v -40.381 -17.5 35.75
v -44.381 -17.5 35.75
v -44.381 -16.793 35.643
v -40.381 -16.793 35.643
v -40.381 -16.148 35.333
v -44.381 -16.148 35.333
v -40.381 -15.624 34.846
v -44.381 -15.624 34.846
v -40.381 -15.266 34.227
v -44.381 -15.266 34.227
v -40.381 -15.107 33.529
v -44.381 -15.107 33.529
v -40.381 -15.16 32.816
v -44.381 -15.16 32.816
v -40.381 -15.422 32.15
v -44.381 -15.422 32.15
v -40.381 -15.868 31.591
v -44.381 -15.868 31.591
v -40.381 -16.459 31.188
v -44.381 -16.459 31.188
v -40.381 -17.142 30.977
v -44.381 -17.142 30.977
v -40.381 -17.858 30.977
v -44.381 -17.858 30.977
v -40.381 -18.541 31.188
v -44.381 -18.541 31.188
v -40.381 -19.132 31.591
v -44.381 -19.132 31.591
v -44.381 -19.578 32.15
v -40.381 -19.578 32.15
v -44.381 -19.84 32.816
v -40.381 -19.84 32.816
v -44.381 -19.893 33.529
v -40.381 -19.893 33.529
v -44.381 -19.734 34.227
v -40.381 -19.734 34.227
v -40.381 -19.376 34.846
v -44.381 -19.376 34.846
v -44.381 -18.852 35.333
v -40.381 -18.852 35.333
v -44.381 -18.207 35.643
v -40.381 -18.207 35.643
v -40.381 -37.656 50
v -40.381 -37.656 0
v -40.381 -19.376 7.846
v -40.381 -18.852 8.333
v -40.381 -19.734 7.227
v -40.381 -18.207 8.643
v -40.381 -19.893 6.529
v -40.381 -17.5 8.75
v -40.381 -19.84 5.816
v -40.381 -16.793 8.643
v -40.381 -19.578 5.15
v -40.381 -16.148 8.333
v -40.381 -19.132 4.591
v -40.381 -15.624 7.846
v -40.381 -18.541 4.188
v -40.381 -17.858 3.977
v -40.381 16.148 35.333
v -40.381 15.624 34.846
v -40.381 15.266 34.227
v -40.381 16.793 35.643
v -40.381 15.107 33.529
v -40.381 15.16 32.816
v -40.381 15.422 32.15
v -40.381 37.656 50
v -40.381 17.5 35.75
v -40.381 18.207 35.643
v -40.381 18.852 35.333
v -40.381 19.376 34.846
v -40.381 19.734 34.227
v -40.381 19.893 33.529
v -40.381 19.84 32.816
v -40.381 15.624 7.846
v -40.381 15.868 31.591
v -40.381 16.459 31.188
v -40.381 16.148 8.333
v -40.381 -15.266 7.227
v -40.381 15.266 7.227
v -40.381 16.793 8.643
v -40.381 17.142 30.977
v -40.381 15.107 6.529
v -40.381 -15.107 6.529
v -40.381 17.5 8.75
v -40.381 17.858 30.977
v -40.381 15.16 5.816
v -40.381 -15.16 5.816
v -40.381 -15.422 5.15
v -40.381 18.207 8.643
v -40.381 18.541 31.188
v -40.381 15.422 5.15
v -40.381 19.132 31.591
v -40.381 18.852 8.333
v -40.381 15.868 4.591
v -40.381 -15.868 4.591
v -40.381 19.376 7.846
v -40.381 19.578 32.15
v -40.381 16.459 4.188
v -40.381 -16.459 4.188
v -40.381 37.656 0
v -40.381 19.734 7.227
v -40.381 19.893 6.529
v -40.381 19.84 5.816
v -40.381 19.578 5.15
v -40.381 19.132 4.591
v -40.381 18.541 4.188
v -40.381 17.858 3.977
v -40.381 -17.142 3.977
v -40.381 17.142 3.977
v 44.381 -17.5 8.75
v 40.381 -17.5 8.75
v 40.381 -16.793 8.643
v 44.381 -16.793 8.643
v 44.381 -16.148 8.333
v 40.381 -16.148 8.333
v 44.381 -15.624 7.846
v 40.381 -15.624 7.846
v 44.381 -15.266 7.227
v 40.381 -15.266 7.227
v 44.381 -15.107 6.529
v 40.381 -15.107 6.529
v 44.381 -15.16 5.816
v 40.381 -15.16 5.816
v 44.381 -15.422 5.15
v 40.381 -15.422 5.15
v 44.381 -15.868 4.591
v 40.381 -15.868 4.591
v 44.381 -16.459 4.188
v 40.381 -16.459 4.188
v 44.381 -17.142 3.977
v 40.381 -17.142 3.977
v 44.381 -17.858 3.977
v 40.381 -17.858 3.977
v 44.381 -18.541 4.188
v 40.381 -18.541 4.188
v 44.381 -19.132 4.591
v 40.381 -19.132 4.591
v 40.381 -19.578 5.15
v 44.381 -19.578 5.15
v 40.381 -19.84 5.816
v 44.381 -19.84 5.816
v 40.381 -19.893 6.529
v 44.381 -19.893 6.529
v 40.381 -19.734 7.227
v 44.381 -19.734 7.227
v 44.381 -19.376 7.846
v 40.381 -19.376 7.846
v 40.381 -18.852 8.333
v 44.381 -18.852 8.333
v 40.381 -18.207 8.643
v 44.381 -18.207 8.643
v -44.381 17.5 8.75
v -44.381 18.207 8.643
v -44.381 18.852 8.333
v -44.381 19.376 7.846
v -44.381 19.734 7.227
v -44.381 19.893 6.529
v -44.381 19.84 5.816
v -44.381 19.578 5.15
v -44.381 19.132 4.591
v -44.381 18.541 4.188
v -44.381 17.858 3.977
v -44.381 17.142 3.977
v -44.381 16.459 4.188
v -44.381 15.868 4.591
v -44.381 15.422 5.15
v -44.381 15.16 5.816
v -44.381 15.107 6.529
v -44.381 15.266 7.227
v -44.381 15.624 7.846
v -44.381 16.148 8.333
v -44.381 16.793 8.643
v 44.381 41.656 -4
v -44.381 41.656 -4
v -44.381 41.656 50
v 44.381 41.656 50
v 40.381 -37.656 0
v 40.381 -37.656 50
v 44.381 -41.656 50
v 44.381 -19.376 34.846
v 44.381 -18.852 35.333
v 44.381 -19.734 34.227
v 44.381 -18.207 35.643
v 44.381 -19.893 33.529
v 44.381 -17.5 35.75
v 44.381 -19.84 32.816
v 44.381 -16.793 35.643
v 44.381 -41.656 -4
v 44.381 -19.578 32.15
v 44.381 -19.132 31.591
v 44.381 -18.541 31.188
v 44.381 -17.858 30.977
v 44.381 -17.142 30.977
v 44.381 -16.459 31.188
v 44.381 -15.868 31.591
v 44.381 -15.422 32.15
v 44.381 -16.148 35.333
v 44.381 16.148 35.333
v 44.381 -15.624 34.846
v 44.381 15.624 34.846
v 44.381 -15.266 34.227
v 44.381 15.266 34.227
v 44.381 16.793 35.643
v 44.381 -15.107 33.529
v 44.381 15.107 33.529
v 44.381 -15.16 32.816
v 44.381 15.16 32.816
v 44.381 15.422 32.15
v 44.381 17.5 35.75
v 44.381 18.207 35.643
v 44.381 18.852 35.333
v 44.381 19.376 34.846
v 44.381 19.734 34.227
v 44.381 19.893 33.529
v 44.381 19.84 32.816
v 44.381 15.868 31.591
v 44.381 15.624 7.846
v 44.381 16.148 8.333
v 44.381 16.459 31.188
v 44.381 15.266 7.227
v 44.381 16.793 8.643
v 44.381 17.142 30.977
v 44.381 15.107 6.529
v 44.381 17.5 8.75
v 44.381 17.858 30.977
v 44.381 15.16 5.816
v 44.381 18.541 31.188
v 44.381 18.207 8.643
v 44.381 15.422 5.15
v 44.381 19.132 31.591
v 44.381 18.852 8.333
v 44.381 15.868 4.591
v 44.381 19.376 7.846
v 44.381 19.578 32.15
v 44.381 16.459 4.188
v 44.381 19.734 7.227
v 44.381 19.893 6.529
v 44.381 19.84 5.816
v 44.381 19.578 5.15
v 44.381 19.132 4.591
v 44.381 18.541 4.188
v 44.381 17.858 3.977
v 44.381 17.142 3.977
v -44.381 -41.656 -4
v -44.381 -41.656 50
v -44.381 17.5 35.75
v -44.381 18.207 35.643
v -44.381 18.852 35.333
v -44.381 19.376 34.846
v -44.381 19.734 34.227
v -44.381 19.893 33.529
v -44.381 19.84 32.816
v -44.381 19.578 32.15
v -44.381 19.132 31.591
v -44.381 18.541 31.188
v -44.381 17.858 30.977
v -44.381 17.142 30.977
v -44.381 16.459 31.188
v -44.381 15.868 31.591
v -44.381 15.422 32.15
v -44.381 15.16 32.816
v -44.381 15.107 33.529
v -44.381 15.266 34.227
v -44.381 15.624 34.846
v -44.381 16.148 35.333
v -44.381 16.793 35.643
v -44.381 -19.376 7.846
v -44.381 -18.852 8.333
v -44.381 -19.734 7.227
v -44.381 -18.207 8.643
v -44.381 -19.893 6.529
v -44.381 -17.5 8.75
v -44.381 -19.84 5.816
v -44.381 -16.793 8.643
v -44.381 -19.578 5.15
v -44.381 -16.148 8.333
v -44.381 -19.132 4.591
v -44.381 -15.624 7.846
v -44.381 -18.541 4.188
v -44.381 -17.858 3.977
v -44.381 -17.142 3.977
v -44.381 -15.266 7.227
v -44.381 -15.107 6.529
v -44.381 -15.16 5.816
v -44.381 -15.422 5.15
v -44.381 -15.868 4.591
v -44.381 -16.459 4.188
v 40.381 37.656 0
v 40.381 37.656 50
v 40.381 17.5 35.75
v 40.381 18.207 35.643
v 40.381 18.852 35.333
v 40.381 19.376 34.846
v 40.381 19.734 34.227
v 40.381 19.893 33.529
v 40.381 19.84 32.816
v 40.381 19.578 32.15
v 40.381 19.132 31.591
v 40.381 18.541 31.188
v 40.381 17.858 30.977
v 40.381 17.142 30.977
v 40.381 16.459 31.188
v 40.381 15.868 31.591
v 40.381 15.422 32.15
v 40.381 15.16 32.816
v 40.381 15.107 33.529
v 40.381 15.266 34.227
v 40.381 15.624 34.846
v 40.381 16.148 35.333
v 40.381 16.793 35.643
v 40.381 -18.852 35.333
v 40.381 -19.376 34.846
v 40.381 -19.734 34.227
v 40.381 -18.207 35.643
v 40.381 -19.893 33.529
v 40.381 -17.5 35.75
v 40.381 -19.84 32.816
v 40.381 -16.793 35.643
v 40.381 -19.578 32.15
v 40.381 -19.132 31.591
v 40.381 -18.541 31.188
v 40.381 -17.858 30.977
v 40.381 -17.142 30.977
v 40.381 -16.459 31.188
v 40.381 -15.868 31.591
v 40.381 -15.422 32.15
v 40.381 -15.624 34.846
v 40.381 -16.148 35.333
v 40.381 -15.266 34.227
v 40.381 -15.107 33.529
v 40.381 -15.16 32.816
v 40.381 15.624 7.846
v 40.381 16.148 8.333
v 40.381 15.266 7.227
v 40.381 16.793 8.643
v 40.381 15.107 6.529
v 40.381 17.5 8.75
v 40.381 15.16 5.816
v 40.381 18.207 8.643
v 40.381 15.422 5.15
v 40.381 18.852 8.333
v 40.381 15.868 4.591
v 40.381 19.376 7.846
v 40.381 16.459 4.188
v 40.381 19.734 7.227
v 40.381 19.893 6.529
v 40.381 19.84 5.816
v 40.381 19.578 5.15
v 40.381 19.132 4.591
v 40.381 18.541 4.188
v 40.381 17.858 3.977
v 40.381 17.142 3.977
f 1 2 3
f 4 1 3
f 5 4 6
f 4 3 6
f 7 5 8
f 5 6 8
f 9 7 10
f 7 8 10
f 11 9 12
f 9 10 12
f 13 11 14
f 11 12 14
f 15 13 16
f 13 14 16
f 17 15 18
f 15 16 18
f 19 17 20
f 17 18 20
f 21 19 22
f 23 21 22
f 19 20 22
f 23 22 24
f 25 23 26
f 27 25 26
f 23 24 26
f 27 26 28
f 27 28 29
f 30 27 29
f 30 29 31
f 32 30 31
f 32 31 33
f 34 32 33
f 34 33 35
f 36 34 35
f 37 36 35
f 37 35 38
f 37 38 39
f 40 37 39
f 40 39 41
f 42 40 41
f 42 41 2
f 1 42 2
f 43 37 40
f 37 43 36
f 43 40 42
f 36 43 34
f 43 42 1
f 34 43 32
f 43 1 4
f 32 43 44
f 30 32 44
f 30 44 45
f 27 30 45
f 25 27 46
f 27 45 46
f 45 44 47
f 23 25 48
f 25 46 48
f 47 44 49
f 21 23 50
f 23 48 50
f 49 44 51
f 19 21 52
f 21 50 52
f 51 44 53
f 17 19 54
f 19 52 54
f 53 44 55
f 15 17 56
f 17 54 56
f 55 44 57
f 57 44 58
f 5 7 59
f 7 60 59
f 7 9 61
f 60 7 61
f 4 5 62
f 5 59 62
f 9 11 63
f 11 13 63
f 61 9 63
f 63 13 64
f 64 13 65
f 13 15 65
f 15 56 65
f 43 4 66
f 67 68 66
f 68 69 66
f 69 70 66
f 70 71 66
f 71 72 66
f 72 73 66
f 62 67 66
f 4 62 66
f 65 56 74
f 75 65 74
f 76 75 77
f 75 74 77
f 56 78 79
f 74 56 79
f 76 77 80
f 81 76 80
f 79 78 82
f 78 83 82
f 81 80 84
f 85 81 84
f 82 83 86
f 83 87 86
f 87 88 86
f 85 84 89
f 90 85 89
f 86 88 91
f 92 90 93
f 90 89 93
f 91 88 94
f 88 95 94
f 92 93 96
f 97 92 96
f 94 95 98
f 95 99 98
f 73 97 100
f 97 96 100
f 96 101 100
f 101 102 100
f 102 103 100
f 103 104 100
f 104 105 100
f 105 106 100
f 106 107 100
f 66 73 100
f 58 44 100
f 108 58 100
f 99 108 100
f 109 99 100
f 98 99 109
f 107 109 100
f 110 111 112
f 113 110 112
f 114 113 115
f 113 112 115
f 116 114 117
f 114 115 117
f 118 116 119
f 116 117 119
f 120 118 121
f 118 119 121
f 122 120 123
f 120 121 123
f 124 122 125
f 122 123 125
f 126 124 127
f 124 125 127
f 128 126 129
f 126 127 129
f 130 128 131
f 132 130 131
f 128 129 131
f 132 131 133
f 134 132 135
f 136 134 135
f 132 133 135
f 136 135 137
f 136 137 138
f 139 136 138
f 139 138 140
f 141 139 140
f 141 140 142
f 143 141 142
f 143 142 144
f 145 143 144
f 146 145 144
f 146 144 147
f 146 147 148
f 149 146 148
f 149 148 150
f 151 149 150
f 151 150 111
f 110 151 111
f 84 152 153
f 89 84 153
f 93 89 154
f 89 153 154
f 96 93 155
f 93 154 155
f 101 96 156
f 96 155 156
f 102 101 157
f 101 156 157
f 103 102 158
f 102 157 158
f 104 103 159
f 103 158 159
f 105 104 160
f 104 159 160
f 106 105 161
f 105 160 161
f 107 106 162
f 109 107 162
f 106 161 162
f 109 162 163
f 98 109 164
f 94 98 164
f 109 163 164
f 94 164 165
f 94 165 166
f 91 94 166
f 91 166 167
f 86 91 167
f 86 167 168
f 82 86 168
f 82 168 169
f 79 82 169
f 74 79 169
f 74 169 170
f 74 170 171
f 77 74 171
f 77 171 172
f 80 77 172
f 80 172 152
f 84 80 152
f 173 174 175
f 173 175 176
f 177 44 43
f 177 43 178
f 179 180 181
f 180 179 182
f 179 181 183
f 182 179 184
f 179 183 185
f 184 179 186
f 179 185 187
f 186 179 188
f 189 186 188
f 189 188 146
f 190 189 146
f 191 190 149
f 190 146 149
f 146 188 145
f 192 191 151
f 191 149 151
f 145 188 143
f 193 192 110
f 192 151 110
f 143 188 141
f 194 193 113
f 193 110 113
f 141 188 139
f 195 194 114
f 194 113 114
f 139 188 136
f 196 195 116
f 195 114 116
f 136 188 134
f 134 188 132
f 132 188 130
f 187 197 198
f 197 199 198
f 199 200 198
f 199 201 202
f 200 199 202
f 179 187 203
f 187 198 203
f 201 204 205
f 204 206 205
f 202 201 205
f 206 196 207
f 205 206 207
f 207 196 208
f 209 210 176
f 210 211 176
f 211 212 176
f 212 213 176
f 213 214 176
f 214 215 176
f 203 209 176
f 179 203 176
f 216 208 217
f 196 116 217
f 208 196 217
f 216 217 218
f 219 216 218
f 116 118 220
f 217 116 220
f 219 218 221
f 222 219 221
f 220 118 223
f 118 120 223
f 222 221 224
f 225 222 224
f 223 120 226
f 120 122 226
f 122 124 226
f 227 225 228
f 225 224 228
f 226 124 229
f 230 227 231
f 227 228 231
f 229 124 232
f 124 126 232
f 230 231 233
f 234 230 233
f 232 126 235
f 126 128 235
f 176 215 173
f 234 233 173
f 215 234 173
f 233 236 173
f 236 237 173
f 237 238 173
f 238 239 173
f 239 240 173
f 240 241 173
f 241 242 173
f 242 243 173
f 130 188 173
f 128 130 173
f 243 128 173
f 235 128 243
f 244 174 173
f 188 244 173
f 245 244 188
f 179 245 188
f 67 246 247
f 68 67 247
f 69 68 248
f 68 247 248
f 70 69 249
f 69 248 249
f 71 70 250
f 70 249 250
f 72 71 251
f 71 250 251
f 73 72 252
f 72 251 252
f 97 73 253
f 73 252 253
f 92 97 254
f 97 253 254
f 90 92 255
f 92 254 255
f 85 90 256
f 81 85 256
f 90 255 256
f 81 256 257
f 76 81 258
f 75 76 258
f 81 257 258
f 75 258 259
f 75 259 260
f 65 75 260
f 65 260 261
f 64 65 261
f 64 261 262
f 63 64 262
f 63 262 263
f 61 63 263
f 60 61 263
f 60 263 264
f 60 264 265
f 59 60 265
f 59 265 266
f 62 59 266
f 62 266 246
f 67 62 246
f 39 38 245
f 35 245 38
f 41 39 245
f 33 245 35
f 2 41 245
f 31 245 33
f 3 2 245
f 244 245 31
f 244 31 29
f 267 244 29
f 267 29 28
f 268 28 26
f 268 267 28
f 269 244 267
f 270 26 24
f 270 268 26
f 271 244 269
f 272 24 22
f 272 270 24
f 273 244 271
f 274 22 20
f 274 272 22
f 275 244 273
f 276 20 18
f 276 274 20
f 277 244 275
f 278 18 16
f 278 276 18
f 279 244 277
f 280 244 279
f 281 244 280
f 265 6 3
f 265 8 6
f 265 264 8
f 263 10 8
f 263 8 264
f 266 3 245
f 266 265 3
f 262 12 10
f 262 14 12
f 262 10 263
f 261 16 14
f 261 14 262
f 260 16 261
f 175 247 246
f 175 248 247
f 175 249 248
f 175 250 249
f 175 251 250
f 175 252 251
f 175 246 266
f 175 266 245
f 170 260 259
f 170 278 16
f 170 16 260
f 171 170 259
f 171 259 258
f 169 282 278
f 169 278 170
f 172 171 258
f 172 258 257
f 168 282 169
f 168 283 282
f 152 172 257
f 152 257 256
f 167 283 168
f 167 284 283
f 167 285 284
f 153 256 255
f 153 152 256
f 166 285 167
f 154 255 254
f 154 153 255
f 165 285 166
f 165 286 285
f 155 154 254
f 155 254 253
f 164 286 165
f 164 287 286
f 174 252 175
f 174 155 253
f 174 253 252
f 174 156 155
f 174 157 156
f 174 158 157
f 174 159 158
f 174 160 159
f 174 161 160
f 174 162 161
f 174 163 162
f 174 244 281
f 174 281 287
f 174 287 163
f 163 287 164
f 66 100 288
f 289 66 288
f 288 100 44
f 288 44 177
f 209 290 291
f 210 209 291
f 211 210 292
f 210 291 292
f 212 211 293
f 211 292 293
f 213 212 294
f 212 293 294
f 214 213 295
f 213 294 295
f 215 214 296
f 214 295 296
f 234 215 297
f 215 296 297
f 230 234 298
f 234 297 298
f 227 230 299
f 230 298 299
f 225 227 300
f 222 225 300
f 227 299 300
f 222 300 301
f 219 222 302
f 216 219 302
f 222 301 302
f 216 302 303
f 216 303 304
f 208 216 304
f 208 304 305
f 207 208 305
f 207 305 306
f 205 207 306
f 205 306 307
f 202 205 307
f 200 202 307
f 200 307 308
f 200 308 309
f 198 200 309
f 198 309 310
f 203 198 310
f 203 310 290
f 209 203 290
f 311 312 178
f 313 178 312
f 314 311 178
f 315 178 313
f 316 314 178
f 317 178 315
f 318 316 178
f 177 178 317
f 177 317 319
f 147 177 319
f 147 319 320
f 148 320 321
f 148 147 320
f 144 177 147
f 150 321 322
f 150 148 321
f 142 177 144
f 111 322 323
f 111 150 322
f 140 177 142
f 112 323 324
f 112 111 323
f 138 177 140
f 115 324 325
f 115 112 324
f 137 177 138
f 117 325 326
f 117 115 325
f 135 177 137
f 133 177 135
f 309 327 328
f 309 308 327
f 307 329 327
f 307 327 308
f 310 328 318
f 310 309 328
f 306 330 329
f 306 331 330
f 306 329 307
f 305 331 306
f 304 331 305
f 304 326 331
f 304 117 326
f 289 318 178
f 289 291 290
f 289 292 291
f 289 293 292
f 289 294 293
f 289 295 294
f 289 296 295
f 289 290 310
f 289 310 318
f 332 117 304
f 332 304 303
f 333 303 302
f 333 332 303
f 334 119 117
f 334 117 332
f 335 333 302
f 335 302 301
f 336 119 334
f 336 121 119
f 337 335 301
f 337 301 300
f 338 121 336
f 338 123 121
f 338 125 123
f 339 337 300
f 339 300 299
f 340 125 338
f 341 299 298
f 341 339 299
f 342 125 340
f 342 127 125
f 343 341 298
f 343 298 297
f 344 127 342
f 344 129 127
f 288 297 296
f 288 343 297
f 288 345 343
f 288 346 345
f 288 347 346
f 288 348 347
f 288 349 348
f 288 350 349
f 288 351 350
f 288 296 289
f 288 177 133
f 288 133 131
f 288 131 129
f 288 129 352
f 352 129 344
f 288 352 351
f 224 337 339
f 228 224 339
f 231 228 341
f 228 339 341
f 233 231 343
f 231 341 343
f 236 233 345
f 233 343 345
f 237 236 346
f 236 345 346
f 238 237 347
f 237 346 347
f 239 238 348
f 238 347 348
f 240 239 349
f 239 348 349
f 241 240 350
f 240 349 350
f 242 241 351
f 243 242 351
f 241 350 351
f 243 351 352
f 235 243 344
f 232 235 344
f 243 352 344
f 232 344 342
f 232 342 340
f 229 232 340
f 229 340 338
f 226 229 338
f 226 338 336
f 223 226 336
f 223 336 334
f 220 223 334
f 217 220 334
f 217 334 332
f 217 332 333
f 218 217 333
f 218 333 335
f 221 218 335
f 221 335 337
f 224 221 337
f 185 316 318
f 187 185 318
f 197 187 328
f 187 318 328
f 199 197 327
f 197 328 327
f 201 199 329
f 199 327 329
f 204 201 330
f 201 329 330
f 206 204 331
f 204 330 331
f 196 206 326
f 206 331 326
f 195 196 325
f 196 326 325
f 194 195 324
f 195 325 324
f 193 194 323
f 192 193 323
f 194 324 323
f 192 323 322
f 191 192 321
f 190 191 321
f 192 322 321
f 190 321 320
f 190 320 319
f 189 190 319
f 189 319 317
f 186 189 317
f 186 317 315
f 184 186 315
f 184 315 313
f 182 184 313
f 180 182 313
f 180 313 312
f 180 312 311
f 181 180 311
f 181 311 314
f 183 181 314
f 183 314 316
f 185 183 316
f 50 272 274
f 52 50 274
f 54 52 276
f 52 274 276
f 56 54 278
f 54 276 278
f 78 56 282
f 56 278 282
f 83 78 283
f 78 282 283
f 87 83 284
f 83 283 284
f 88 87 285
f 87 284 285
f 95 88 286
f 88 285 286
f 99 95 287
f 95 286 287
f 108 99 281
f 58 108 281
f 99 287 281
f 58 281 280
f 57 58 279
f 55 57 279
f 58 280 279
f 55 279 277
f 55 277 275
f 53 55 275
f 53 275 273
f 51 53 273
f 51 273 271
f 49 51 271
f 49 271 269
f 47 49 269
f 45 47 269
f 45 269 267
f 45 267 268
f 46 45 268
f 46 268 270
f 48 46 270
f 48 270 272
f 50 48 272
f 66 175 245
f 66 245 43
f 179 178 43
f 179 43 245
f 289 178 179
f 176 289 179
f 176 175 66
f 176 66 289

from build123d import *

# Parameters (mm, degrees)
SKETCH1_W            = 80.762
SKETCH1_H            = 75.312
BOSS_EXTRUDE1_DEPTH  = 50
SHELL1_T             = 4
M4_CLEARANCE_HOLE1_D = 4.8


with BuildPart() as part:
    # Sketch1 → Boss-Extrude1 (new body)
    with BuildSketch(Plane.XY):
        Rectangle(SKETCH1_W, SKETCH1_H)
    extrude(amount=BOSS_EXTRUDE1_DEPTH)

    # Shell1
    shell1_openings = [part.faces().sort_by_distance(p)[0] for p in [
        (0, 0, 50),
    ]]
    offset(amount=SHELL1_T, openings=shell1_openings, kind=Kind.INTERSECTION)

    # M4 Clearance Hole1 (through all)
    with Locations(Plane(origin=(44.381, 0, 0), x_dir=(0, 0, -1), z_dir=(1, 0, 0))):
        with Locations((-33.35, -17.5), (-6.35, -17.5), (-33.35, 17.5), (-6.35, 17.5)):
            Hole(M4_CLEARANCE_HOLE1_D / 2)


solid = part.part
